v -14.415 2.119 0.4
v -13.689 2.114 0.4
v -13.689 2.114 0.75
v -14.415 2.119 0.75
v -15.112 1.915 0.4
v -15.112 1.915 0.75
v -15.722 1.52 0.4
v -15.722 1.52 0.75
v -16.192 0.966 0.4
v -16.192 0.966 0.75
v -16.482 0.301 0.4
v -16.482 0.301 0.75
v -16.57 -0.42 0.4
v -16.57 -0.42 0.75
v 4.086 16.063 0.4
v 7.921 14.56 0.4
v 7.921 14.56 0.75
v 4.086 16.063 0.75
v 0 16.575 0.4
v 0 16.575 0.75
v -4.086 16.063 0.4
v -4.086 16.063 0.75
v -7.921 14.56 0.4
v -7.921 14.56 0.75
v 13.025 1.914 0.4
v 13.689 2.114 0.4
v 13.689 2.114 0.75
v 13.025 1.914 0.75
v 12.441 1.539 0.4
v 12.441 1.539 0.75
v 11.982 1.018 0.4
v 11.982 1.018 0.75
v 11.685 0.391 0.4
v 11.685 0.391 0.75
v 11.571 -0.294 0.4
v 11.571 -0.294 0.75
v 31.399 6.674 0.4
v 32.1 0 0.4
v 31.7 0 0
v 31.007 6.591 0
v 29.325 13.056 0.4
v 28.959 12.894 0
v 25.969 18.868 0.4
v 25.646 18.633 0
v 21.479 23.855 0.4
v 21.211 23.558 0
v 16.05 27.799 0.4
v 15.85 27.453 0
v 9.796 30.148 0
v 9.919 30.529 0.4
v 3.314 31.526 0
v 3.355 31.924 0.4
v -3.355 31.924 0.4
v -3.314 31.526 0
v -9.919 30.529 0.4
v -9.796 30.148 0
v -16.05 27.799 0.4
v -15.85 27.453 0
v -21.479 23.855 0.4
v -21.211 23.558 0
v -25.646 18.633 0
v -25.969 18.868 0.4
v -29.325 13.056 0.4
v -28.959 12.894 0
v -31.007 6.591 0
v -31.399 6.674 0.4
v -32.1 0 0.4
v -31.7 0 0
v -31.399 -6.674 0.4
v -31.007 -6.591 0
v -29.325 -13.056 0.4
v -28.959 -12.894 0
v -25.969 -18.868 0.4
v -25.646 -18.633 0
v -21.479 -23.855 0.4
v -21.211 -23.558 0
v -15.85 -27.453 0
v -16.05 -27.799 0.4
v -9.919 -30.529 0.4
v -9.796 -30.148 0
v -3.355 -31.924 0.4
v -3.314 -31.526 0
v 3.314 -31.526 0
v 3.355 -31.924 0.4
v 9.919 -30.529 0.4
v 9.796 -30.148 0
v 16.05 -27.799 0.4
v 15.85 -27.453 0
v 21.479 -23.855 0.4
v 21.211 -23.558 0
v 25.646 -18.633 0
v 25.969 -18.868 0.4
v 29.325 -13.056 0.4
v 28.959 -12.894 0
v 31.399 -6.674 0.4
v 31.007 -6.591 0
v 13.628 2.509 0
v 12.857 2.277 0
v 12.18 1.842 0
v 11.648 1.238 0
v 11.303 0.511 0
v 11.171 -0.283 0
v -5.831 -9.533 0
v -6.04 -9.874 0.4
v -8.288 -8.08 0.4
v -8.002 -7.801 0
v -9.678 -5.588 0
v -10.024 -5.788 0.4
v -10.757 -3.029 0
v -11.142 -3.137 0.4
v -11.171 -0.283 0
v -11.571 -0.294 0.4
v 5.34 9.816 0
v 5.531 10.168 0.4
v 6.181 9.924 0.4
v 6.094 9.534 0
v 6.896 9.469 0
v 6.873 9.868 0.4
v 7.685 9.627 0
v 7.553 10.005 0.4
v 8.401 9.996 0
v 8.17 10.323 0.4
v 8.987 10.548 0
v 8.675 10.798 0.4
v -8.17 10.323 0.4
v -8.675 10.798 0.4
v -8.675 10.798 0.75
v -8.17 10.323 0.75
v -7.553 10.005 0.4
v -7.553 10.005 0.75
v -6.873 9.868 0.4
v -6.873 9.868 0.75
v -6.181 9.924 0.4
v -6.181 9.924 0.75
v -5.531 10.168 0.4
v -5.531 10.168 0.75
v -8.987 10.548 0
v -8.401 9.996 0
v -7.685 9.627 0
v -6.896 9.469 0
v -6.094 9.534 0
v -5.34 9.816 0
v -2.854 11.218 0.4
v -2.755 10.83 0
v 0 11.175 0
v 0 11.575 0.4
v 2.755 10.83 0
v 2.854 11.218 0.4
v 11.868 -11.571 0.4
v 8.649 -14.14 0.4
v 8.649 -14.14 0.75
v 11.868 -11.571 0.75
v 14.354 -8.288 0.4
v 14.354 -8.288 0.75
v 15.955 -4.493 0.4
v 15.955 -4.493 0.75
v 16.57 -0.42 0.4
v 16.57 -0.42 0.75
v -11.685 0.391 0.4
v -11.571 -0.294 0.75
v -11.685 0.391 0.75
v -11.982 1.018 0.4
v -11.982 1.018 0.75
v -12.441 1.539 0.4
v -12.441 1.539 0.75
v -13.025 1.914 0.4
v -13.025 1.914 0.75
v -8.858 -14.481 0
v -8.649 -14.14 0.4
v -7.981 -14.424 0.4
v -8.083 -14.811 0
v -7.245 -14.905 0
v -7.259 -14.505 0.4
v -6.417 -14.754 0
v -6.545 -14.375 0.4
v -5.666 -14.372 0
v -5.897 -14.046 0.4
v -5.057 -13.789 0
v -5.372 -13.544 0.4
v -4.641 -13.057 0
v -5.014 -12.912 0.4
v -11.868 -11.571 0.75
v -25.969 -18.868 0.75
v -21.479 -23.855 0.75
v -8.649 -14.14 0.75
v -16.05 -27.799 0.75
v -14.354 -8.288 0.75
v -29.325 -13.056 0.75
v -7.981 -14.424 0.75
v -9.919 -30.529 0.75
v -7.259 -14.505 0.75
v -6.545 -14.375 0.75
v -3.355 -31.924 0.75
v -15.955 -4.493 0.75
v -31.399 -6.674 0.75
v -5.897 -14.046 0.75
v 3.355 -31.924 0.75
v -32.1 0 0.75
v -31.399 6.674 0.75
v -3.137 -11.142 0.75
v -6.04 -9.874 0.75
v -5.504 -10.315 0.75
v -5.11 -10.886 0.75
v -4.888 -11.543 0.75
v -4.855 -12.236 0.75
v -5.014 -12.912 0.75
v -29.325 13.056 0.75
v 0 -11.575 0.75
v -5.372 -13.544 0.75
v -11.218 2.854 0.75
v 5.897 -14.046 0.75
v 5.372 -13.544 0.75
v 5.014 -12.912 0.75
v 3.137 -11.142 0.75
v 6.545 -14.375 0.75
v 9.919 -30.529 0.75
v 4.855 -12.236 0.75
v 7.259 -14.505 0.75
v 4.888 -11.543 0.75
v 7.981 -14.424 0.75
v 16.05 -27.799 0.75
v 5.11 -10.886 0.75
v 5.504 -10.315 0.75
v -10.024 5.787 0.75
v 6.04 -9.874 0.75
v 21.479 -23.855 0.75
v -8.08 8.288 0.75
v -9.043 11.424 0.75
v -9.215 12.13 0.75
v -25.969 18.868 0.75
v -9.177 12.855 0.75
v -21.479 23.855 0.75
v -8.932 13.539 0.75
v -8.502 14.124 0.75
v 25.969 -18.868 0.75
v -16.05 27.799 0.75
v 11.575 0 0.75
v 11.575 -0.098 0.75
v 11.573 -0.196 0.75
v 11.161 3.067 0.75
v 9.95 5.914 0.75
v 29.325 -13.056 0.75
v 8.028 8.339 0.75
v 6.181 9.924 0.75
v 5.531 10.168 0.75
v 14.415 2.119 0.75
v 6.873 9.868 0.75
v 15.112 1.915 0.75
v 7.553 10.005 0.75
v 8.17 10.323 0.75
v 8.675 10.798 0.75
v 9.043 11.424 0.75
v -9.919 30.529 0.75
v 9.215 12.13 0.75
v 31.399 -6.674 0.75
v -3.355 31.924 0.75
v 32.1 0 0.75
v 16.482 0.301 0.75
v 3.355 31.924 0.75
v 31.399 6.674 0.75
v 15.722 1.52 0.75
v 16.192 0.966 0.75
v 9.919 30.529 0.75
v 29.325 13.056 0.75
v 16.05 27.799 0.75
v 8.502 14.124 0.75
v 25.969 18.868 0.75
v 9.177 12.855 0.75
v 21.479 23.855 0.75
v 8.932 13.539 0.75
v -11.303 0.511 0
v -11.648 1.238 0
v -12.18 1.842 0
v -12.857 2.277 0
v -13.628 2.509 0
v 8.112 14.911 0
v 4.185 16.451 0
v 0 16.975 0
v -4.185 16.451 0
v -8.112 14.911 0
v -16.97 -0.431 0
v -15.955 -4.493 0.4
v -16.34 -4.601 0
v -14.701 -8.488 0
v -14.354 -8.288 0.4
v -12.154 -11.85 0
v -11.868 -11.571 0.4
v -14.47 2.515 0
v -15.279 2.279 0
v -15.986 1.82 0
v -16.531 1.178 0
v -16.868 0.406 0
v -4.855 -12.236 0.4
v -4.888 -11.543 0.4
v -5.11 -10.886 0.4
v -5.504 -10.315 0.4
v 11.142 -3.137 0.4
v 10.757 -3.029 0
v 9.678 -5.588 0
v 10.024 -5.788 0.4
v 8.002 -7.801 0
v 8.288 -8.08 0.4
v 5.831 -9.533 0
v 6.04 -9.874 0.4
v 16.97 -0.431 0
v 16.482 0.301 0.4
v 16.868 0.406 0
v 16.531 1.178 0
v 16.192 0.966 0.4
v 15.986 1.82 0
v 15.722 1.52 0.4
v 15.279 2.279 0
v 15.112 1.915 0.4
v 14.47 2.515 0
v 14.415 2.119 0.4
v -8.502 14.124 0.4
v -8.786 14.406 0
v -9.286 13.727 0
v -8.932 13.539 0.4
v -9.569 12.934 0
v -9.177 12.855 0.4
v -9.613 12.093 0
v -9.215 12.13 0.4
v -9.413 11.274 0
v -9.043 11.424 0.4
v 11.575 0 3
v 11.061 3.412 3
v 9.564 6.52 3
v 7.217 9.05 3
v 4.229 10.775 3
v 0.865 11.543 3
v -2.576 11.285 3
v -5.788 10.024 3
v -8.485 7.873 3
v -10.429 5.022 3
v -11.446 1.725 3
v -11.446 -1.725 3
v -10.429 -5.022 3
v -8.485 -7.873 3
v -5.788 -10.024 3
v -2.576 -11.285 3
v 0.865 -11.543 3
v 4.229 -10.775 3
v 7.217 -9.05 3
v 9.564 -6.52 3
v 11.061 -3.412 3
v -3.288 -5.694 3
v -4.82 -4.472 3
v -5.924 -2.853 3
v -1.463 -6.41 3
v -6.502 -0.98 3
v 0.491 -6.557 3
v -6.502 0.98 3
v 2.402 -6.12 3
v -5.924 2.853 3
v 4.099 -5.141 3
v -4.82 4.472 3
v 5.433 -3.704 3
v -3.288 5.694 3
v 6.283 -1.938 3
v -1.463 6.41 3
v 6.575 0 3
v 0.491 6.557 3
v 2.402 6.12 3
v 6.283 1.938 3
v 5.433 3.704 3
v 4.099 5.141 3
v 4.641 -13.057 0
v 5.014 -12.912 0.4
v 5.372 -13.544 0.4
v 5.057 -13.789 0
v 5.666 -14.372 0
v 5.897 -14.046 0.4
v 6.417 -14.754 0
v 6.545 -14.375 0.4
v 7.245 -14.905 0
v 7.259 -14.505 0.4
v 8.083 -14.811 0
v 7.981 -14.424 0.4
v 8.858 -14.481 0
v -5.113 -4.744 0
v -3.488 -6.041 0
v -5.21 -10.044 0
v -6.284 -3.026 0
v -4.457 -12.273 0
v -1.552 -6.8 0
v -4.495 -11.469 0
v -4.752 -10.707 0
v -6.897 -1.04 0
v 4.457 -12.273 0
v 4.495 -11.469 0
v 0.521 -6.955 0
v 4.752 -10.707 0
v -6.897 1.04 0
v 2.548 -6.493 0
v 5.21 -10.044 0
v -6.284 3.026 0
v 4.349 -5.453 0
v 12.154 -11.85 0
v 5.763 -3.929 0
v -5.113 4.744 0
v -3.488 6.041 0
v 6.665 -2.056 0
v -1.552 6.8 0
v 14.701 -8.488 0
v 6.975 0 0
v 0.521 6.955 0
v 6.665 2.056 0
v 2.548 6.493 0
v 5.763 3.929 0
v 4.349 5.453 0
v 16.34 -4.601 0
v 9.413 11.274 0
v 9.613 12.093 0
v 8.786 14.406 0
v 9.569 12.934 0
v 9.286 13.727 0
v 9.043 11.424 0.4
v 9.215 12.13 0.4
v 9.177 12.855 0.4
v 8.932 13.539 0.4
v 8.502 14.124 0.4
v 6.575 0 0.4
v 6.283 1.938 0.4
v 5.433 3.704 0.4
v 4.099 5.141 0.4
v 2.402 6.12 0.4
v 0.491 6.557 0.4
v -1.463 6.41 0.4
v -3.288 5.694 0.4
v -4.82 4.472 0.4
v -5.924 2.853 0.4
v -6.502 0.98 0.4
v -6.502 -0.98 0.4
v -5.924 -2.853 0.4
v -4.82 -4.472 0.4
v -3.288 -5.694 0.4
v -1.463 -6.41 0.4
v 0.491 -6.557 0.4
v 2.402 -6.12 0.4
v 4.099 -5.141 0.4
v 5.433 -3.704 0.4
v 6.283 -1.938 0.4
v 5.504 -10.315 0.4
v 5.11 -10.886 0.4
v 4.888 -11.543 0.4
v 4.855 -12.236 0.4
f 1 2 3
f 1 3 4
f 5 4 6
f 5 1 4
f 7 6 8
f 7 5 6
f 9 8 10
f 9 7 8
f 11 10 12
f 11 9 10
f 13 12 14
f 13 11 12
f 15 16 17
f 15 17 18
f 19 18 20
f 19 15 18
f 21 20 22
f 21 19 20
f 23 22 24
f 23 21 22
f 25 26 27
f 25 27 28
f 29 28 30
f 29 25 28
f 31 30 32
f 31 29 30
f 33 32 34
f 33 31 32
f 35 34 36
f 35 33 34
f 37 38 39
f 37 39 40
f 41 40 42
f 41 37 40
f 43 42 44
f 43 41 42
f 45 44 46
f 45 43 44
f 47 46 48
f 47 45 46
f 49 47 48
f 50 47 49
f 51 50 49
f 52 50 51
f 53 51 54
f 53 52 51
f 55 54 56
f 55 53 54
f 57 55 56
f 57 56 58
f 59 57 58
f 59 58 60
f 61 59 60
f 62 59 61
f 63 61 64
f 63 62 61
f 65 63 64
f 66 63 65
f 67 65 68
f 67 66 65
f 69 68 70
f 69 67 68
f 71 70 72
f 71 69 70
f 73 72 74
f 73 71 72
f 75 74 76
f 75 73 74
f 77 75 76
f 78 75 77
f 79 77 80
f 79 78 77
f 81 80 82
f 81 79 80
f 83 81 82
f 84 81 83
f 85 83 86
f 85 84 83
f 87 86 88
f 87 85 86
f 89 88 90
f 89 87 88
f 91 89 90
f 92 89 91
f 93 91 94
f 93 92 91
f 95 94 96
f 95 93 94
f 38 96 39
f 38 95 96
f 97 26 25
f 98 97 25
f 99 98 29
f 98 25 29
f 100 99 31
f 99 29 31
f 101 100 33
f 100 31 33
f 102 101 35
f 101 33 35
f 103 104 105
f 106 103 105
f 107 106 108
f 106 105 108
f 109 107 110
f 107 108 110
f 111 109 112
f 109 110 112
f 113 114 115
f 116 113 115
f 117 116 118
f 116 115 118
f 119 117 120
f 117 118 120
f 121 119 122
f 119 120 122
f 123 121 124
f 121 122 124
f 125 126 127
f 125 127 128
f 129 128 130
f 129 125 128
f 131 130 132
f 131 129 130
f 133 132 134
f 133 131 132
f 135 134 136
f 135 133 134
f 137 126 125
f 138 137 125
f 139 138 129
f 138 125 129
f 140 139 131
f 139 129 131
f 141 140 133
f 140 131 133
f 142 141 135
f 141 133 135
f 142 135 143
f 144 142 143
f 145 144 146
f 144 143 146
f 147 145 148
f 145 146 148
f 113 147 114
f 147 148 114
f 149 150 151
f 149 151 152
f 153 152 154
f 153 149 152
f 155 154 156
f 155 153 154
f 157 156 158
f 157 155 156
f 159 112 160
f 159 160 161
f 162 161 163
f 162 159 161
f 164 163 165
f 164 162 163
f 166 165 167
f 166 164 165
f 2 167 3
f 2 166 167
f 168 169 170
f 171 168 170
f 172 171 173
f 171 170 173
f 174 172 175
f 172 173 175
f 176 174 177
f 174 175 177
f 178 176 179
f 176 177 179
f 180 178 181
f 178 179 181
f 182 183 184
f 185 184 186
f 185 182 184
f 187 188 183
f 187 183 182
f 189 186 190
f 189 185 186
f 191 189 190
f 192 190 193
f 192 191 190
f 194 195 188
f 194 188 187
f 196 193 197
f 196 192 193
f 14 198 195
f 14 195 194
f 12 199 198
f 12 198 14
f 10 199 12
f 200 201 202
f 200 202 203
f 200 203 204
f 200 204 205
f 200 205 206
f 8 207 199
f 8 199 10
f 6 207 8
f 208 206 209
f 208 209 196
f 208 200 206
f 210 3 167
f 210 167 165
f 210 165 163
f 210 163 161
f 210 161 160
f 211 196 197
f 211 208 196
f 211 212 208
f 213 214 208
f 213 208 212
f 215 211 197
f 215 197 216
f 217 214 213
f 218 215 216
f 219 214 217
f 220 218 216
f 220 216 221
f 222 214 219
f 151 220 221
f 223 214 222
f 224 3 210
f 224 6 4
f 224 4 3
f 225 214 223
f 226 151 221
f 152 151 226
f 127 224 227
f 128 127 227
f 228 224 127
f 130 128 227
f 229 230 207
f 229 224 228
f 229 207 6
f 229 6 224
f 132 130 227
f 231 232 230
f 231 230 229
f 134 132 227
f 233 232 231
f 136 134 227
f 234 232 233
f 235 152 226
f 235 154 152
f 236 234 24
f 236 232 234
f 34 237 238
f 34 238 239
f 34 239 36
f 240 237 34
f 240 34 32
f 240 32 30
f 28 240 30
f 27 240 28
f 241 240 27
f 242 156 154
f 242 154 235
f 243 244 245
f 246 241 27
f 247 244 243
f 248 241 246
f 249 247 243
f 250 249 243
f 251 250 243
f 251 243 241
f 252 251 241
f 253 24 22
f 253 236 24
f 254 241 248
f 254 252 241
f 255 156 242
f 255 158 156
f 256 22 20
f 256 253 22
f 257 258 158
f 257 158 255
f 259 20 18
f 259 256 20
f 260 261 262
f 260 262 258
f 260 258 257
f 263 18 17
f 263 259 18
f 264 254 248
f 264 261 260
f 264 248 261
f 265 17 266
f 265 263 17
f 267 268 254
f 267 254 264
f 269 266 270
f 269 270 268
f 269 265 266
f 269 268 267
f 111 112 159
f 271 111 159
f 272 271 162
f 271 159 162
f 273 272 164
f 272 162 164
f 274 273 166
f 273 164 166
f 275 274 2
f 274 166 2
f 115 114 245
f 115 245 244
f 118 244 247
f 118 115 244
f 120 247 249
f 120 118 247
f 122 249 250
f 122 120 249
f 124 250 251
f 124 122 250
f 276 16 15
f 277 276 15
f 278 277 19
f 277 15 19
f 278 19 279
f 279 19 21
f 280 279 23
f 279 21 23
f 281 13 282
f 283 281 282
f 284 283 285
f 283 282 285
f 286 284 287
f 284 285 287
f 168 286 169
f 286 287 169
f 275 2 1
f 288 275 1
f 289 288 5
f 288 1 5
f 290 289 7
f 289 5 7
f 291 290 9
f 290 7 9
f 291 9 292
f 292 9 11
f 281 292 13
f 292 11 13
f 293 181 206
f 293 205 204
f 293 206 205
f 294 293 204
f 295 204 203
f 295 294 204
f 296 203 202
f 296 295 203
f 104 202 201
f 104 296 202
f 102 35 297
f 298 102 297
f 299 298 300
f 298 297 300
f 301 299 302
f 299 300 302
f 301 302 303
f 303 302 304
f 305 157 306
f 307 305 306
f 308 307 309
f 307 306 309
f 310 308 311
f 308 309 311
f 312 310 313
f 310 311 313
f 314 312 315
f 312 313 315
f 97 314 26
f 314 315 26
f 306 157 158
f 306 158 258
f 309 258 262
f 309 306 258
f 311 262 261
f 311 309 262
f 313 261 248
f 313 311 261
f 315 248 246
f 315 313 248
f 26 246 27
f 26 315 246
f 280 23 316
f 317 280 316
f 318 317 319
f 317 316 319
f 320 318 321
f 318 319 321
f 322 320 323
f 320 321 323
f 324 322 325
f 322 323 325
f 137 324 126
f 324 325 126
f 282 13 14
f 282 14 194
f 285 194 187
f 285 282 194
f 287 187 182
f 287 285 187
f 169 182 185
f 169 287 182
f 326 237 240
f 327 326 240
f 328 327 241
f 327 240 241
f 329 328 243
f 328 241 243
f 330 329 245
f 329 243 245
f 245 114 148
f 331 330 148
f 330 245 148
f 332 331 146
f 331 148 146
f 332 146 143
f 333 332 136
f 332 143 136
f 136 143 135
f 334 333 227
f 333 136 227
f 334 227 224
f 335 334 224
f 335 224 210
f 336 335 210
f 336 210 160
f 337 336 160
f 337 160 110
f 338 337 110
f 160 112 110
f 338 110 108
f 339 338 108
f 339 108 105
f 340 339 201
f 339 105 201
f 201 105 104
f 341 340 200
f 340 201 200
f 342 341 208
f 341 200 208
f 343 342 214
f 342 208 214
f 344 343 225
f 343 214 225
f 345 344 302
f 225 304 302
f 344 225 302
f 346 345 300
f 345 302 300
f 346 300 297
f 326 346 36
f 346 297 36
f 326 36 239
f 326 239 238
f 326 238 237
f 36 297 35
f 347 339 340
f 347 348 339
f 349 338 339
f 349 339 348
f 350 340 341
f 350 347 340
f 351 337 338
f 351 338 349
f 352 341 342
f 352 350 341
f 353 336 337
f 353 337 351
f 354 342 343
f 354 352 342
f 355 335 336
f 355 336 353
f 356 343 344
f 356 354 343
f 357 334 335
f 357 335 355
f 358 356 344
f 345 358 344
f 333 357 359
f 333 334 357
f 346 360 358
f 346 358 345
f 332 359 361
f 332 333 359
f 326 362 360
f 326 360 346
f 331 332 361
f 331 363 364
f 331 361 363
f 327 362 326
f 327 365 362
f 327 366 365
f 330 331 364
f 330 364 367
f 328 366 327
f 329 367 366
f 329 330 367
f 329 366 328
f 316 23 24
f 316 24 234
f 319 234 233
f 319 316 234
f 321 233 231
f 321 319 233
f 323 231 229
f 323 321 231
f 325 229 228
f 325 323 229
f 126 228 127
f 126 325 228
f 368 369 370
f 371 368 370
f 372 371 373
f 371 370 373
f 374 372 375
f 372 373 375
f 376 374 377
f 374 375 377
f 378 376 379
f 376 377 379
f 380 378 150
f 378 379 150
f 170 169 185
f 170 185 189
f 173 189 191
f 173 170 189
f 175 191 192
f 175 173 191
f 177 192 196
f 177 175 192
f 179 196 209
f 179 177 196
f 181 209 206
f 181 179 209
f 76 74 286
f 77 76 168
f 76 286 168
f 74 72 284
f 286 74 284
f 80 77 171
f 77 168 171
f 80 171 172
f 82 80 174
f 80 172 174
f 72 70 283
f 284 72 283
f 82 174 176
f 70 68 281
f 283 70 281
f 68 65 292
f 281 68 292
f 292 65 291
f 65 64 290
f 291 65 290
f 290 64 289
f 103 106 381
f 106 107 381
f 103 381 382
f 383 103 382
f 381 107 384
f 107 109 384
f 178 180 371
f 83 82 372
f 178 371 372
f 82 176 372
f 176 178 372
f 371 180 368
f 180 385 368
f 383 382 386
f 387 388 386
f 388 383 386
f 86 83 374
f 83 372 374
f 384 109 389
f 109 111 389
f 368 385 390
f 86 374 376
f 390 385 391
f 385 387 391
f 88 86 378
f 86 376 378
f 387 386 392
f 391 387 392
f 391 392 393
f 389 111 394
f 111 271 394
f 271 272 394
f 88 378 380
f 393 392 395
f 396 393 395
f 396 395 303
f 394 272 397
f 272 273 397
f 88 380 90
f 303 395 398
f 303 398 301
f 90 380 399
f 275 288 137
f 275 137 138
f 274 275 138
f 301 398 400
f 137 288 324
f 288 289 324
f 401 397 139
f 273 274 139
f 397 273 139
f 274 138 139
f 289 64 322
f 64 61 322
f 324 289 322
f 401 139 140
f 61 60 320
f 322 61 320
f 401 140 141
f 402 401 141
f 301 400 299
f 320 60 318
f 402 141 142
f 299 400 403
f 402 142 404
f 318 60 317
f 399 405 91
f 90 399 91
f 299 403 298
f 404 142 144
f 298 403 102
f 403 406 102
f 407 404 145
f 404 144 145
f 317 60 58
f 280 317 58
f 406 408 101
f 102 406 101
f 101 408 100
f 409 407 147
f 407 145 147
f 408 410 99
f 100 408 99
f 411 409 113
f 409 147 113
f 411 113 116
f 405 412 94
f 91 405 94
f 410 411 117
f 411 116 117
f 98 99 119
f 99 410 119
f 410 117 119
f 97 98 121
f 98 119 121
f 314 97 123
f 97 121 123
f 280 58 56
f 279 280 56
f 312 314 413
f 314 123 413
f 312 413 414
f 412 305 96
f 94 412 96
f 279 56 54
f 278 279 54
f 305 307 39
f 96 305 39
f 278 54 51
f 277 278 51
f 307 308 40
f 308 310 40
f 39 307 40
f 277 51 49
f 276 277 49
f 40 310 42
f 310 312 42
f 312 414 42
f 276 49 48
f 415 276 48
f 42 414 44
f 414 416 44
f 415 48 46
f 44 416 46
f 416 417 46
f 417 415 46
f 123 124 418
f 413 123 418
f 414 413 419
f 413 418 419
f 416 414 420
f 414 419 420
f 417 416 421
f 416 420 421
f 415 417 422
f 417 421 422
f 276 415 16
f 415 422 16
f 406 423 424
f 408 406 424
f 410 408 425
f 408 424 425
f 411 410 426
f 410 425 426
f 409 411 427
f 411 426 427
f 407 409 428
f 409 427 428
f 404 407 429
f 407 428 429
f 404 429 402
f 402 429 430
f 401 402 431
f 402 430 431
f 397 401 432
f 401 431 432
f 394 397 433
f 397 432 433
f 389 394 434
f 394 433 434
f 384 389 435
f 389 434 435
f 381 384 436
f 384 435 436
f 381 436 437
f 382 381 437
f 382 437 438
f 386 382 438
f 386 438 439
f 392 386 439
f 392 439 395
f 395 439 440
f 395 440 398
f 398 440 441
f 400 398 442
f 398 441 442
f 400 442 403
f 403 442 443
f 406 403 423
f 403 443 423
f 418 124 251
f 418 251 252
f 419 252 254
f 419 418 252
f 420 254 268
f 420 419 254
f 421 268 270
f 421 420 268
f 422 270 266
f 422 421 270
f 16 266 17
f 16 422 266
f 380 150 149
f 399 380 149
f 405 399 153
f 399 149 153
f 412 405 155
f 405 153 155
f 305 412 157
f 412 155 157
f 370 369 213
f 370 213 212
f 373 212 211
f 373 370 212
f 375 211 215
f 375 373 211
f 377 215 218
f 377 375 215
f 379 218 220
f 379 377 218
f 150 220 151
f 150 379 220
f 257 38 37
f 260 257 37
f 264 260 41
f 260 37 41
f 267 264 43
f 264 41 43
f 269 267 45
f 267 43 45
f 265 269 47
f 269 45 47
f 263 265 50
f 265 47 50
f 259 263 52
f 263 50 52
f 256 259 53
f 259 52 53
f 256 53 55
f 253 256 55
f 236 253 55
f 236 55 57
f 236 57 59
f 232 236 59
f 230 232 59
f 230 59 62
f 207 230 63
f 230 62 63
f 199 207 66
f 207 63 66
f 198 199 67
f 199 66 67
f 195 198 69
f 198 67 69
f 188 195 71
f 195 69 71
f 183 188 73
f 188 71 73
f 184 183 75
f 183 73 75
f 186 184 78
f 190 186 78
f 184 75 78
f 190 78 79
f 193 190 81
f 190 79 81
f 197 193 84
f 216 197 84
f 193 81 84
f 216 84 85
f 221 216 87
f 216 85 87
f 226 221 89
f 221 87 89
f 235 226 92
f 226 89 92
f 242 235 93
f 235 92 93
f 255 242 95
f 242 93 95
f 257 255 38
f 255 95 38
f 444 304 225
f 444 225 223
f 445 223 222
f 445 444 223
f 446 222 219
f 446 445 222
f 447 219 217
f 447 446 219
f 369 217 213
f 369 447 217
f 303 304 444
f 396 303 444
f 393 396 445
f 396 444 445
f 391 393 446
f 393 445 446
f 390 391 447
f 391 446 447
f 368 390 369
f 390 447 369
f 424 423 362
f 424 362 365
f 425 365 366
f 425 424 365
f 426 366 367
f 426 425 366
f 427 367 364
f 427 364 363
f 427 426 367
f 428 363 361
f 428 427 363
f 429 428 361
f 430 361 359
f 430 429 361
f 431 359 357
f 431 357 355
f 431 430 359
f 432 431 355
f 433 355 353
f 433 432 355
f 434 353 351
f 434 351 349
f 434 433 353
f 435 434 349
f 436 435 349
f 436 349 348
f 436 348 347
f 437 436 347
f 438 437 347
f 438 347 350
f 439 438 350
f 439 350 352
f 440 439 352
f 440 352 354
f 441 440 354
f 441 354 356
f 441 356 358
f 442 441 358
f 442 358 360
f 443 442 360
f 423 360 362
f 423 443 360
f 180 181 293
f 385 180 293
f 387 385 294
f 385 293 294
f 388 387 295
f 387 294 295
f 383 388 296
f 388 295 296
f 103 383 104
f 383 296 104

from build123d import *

# Parameters (mm, degrees)
F0_R     = 32.1
F0_R_2   = 6.575
F3_DEPTH = 0.75
F4_DEPTH = 25
F1_R     = 11.575
F1_R_2   = 6.575
F5_DEPTH = 3
F6_SIZE  = 0.4


with BuildPart() as f3:
    # F0 (on Top) → F3 (new body)
    with BuildSketch(Plane.XY):
        Circle(F0_R)
        Circle(F0_R_2, mode=Mode.SUBTRACT)
    extrude(amount=F3_DEPTH)

    # F2 (on Top) → F4 (cut)
    with BuildSketch(Plane.XY):
        with BuildLine():
            ThreePointArc((11.5712747437, -0.2936423108), (11.5740686484, -0.1468329699), (11.575, 0))
            ThreePointArc((11.575, 0), (9.9500209897, 5.9141954063), (5.5313356711, 10.1678390376))
            ThreePointArc((5.5313356711, 10.1678390376), (0, 11.575), (-5.5313356711, 10.1678390376))
            ThreePointArc((-5.5313356711, 10.1678390376), (-10.0242440488, 5.7875), (-11.5712747437, -0.2936423108))
            ThreePointArc((-11.5712747437, -0.2936423108), (-10.0242440488, -5.7875), (-6.0399390726, -9.8741967268))
            ThreePointArc((-6.0399390726, -9.8741967268), (0, -11.575), (6.0399390726, -9.8741967268))
            ThreePointArc((6.0399390726, -9.8741967268), (10.0242440488, -5.7875), (11.5712747437, -0.2936423108))
        make_face()
        with BuildLine():
            ThreePointArc((-5.5313356711, 10.1678390376), (0, 11.575), (5.5313356711, 10.1678390376))
            ThreePointArc((5.5313356711, 10.1678390376), (7.2175038611, 9.9127061865), (8.6749690104, 10.7981728857))
            ThreePointArc((8.6749690104, 10.7981728857), (9.1772189992, 12.8554118424), (7.9206815333, 14.5599941294))
            ThreePointArc((7.9206815333, 14.5599941294), (0, 16.575), (-7.9206815333, 14.5599941294))
            ThreePointArc((-7.9206815333, 14.5599941294), (-9.1772189992, 12.8554118424), (-8.6749690104, 10.7981728857))
            ThreePointArc((-8.6749690104, 10.7981728857), (-7.2175038611, 9.9127061865), (-5.5313356711, 10.1678390376))
        make_face()
        with BuildLine():
            ThreePointArc((13.6889765386, 2.1136570972), (12.1934073083, 1.2941886024), (11.5712747437, -0.2936423108))
            ThreePointArc((11.5712747437, -0.2936423108), (10.0242440488, -5.7875), (6.0399390726, -9.8741967268))
            ThreePointArc((6.0399390726, -9.8741967268), (4.9759034472, -11.2068947889), (5.0140075282, -12.9118299829))
            ThreePointArc((5.0140075282, -12.9118299829), (6.544503732, -14.3754107106), (8.6489840283, -14.1395084878))
            ThreePointArc((8.6489840283, -14.1395084878), (14.3543710677, -8.2875), (16.5696655617, -0.4204856416))
            ThreePointArc((16.5696655617, -0.4204856416), (15.7217227312, 1.5199988682), (13.6889765386, 2.1136570972))
        make_face()
        with BuildLine():
            ThreePointArc((-6.0399390726, -9.8741967268), (-10.0242440488, -5.7875), (-11.5712747437, -0.2936423108))
            ThreePointArc((-11.5712747437, -0.2936423108), (-12.1934073083, 1.2941886024), (-13.6889765386, 2.1136570972))
            ThreePointArc((-13.6889765386, 2.1136570972), (-15.7217227312, 1.5199988682), (-16.5696655617, -0.4204856416))
            ThreePointArc((-16.5696655617, -0.4204856416), (-14.3543710677, -8.2875), (-8.6489840283, -14.1395084878))
            ThreePointArc((-8.6489840283, -14.1395084878), (-6.544503732, -14.3754107106), (-5.0140075282, -12.9118299829))
            ThreePointArc((-5.0140075282, -12.9118299829), (-4.9759034472, -11.2068947889), (-6.0399390726, -9.8741967268))
        make_face()
    extrude(amount=F4_DEPTH, mode=Mode.SUBTRACT)

    # F1 (on Top) → F5 (join)
    with BuildSketch(Plane.XY):
        Circle(F1_R)
        Circle(F1_R_2, mode=Mode.SUBTRACT)
    extrude(amount=F5_DEPTH)

    # F6
    f6_edges = [f3.edges().sort_by_distance(p)[0] for p in [
        (-32.1, 0, 0),
        (8.922086, 11.169244, 0),
        (0, 11.575, 0),
        (-8.922086, 11.169244, 0),
        (0, 16.575, 0),
        (-14.133892, 2.142131, 0),
        (-10.024244, -5.7875, 0),
        (-5.211806, -13.311375, 0),
        (-14.354371, -8.2875, 0),
        (5.211806, -13.311375, 0),
        (10.024244, -5.7875, 0),
        (14.133892, 2.142131, 0),
        (14.354371, -8.2875, 0),
        (-6.575, 0, 0),
    ]]
    chamfer(f6_edges, length=F6_SIZE)


solid = f3.part
